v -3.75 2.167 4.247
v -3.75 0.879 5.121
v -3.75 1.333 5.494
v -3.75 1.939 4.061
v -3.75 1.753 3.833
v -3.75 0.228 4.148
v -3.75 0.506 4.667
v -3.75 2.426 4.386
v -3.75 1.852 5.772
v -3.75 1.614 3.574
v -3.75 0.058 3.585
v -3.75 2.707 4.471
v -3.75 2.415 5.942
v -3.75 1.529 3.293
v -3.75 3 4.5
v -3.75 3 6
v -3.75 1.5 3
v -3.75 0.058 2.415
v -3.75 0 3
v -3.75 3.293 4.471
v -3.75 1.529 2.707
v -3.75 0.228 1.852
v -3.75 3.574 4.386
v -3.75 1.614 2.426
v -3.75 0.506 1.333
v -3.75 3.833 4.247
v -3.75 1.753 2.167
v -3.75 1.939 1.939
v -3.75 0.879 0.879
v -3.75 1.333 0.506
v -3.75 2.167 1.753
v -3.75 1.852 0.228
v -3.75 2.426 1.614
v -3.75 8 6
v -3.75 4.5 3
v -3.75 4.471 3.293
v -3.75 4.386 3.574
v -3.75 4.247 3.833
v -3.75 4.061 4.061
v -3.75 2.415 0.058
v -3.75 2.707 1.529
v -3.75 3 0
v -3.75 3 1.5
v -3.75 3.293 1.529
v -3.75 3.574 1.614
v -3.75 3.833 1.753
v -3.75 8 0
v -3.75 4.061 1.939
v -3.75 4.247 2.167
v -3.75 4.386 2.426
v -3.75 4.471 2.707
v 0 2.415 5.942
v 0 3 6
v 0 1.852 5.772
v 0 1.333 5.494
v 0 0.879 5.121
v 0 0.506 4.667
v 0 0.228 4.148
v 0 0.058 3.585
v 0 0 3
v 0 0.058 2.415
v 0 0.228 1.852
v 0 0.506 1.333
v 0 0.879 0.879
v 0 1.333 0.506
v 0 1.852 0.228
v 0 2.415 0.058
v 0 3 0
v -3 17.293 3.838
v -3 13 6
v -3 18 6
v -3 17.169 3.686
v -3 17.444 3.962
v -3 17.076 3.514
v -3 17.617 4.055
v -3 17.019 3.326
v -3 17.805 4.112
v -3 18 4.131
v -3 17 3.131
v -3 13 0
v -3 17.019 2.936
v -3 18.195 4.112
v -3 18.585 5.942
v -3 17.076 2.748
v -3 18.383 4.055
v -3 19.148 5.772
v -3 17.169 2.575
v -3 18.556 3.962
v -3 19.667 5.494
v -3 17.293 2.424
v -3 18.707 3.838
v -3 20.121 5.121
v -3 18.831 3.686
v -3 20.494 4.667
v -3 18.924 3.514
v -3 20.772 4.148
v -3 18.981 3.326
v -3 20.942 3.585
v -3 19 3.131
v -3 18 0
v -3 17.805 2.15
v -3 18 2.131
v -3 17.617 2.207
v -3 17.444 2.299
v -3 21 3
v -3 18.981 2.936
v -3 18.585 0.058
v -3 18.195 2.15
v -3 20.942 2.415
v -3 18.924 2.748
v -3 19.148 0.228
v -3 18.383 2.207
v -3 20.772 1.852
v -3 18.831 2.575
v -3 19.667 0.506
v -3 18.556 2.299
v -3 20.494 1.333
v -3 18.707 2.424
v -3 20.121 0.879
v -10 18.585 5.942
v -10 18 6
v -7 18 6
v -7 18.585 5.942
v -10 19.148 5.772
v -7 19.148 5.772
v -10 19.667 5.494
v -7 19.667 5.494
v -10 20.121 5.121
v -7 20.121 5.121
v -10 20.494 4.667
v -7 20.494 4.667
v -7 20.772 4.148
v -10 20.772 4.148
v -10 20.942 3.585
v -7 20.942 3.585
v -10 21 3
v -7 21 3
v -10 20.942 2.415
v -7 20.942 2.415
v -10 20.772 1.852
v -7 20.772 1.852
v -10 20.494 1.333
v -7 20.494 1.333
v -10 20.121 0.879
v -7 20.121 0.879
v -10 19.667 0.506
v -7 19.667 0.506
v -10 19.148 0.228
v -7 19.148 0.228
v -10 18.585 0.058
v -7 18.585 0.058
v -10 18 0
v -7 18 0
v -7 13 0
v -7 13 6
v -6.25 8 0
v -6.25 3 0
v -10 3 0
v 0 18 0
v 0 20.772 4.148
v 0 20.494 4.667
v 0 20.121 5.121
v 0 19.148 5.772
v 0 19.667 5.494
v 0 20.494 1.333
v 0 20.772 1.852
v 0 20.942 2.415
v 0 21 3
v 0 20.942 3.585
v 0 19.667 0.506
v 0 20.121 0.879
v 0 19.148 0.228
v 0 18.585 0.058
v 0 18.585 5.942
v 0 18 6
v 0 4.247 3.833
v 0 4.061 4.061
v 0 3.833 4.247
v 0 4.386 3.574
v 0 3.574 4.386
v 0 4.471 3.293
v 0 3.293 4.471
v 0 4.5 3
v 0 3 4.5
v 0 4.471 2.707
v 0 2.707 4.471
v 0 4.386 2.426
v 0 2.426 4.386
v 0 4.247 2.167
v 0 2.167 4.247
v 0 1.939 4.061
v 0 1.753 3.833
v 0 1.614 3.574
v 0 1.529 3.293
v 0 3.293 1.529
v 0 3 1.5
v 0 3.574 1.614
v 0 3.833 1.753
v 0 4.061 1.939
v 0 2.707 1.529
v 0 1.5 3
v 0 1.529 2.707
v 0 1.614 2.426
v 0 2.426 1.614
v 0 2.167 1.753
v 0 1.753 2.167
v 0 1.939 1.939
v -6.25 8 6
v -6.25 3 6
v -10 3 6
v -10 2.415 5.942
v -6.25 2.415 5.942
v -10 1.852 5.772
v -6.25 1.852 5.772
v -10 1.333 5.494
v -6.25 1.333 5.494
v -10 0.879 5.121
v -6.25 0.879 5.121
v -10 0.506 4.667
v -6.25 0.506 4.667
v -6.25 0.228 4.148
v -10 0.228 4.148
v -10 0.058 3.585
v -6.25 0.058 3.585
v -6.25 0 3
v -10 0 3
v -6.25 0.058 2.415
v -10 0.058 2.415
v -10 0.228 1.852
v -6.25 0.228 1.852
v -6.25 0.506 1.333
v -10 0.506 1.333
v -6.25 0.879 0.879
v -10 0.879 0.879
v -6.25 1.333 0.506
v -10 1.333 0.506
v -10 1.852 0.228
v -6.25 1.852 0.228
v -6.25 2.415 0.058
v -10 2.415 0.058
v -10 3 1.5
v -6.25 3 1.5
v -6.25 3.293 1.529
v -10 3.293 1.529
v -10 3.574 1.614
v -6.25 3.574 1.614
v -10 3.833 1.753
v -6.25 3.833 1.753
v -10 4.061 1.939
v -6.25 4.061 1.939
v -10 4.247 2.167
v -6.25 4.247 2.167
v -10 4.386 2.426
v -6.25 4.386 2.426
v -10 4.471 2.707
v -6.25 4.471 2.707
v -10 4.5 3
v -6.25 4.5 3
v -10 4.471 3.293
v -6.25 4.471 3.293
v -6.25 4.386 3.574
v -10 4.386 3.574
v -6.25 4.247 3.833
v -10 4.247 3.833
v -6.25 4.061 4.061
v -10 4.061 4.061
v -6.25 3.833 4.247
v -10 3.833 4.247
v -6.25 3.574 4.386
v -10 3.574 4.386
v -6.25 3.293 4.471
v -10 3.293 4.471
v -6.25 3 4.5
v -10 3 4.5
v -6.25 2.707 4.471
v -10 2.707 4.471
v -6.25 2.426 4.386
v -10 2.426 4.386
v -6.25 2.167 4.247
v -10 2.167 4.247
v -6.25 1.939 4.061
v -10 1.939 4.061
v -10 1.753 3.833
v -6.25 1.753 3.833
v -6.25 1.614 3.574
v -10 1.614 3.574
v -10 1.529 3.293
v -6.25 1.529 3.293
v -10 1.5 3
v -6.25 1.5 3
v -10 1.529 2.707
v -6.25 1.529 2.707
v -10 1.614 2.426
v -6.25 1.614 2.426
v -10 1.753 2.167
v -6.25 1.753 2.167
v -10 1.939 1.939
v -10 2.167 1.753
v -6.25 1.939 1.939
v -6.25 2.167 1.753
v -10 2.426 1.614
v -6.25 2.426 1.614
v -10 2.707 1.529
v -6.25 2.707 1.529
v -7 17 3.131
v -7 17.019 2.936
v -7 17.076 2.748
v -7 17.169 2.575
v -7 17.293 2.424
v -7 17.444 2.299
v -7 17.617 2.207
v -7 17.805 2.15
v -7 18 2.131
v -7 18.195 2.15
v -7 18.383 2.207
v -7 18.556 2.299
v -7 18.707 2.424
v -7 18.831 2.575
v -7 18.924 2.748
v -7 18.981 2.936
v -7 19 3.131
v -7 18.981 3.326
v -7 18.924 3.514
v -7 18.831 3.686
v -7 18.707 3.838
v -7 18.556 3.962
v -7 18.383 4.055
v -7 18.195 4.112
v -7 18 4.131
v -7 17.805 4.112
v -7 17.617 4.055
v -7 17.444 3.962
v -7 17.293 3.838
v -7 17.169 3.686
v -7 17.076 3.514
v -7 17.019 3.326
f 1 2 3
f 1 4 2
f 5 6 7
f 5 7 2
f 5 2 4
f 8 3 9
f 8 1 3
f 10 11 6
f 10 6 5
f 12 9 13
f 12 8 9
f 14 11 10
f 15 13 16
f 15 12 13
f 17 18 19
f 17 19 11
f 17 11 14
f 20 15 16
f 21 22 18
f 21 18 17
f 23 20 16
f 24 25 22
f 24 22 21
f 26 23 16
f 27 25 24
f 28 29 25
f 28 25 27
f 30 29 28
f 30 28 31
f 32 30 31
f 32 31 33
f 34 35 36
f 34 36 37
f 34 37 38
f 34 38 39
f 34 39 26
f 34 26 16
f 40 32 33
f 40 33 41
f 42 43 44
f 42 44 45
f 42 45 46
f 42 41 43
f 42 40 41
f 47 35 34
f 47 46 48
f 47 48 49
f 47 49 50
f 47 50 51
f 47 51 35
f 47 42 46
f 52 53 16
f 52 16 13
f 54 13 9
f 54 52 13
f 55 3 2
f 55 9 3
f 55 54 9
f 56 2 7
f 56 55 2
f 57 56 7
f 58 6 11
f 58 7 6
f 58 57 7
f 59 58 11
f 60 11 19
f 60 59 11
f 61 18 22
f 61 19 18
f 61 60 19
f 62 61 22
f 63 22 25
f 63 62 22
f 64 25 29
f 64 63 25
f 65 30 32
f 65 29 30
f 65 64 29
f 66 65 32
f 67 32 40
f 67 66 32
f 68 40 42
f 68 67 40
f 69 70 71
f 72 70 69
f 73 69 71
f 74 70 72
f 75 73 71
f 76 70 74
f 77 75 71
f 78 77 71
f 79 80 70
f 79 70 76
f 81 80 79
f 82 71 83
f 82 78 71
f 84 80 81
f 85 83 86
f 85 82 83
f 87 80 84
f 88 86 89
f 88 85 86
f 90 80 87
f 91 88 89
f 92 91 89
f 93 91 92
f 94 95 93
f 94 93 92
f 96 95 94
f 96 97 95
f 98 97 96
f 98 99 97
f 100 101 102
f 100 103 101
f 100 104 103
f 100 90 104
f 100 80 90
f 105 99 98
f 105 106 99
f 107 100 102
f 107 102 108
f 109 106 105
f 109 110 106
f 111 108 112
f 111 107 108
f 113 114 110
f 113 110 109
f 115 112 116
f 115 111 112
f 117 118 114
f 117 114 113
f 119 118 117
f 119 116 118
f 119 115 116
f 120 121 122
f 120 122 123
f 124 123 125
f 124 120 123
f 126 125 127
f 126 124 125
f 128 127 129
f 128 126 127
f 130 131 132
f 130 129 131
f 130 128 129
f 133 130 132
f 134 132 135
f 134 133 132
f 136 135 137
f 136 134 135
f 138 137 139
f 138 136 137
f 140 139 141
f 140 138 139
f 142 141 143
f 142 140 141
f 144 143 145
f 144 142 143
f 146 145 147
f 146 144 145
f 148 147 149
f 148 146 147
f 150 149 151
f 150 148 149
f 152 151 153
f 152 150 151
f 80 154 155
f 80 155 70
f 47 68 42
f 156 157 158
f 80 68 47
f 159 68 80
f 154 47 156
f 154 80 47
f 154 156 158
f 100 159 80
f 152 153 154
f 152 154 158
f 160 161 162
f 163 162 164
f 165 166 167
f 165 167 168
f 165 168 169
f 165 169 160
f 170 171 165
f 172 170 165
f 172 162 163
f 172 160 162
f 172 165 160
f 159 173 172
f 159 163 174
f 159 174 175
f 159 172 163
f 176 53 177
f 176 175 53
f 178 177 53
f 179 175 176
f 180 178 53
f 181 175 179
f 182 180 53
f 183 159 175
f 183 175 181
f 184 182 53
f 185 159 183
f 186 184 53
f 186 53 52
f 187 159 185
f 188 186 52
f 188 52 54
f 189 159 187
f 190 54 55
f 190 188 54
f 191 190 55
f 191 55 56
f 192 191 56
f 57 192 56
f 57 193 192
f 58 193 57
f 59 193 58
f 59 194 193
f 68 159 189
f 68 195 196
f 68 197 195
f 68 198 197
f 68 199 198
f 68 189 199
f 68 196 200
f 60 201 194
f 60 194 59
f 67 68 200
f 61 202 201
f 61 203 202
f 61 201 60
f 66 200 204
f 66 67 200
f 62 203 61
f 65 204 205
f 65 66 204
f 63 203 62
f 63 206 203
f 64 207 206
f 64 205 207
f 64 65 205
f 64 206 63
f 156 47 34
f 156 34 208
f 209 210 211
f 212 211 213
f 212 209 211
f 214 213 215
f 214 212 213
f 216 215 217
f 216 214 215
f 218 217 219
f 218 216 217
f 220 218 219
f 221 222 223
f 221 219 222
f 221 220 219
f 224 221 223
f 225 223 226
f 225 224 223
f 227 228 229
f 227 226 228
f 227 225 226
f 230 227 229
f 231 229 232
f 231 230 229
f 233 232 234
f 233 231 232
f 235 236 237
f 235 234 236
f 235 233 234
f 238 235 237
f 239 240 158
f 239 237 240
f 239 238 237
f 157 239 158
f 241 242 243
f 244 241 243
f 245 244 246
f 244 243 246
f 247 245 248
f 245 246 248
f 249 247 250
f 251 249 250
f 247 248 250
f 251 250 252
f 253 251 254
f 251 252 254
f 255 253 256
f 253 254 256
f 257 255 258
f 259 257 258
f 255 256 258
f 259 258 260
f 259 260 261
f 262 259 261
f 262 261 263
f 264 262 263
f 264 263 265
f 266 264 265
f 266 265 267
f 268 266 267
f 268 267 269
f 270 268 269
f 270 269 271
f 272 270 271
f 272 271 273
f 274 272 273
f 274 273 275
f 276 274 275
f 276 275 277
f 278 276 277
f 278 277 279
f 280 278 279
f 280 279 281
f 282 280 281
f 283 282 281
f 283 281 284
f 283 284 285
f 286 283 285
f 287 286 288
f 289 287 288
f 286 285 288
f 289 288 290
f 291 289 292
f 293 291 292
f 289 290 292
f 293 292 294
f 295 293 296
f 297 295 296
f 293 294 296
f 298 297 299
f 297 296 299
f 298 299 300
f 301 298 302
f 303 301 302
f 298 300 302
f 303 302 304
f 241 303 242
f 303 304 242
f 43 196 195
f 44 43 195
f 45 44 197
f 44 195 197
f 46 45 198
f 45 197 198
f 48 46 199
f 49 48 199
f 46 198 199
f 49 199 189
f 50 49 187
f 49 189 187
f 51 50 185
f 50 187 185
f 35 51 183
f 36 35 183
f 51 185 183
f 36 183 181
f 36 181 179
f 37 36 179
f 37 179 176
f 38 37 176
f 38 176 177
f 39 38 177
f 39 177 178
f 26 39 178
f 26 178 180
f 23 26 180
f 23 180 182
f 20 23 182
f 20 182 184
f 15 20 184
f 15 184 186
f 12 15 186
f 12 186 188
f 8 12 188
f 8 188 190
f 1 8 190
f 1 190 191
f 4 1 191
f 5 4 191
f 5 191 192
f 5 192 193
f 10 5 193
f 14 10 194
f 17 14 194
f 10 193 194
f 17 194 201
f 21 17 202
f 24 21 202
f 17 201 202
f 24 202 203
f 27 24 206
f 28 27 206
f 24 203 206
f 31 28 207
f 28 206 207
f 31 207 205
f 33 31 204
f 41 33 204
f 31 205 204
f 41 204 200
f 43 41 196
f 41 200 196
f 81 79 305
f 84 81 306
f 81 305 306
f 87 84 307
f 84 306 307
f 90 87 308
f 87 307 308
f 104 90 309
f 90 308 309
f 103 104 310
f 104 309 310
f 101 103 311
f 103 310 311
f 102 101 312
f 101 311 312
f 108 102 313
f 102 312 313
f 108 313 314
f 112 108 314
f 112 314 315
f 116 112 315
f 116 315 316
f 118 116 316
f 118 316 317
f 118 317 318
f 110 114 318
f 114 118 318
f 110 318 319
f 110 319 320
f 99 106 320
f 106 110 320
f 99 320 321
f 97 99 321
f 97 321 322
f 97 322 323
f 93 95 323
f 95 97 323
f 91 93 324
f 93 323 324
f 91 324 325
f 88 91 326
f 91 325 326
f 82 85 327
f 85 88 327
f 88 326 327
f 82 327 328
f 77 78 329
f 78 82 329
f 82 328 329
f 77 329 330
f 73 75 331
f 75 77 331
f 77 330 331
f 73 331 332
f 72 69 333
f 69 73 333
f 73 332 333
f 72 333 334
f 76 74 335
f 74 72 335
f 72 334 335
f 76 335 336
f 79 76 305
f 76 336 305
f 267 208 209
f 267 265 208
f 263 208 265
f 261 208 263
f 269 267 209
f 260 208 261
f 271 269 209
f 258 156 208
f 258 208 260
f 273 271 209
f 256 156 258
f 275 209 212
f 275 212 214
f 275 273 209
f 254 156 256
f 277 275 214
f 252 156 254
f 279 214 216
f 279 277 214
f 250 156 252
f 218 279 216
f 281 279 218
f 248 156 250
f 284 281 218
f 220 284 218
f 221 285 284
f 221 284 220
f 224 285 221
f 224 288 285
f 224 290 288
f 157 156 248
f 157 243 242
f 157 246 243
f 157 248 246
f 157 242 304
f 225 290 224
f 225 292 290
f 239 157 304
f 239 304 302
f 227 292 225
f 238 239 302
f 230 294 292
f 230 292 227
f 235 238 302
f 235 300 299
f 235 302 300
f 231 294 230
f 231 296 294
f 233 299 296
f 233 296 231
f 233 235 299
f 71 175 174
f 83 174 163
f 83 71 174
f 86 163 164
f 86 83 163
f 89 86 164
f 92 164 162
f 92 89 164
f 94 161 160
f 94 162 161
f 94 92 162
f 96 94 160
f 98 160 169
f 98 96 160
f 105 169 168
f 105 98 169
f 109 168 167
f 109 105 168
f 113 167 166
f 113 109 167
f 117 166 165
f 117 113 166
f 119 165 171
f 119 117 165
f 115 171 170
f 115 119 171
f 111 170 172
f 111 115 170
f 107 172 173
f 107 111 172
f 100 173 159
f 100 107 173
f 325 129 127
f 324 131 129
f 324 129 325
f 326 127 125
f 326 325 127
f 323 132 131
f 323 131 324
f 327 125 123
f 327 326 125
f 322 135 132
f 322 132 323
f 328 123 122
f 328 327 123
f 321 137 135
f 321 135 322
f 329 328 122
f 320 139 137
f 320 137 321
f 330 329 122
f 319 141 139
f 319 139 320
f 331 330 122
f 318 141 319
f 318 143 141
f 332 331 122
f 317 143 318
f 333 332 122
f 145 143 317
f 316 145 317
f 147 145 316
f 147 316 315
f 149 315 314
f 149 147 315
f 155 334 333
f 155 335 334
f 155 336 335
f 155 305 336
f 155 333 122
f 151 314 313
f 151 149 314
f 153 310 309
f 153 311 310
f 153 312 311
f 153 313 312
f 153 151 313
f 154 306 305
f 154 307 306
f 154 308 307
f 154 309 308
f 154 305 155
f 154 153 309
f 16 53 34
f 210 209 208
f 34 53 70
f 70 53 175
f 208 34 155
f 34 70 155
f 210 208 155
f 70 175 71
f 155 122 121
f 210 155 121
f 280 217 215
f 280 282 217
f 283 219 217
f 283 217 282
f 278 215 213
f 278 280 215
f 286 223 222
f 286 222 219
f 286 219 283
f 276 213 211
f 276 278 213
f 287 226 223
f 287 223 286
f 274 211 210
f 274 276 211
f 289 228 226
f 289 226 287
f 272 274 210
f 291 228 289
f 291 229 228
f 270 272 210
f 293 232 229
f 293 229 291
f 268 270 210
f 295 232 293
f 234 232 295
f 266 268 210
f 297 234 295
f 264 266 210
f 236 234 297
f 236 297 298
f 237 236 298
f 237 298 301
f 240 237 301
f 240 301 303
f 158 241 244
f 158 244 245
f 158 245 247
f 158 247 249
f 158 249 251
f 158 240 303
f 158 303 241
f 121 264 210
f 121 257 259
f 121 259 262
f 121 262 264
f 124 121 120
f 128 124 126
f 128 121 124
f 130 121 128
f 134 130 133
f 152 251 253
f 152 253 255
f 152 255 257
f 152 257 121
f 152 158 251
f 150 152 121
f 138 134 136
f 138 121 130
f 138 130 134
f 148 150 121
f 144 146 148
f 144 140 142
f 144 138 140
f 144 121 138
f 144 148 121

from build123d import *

# Parameters (mm, degrees)
SALIENTE_EXTRUIR1_DEPTH = 6
REDONDEO1_RADIUS        = 3
REDONDEO1_LENGTH        = 3.75
REDONDEO2_RADIUS        = 3
REDONDEO2_LENGTH        = 3
REDONDEO3_RADIUS        = 3
REDONDEO3_LENGTH        = 3
REDONDEO4_RADIUS        = 3
REDONDEO4_LENGTH        = 3.75
CORTAR_EXTRUIR1_REACH   = 26.021
CROQUIS2_R              = 1.5
SALIENTE_EXTRUIR3_REACH = 24.935
CROQUIS4_R              = 1


with BuildPart() as part:
    # Croquis1 → Saliente-Extruir1 (new body)
    with BuildSketch(Plane.XY):
        Polygon((-7, 21), (-7, 13), (-3, 13), (-3, 21), (0, 21), (0, 0), (-3.75, 0), (-3.75, 8), (-6.25, 8), (-6.25, 0), (-10, 0), (-10, 21), align=None)
    extrude(amount=SALIENTE_EXTRUIR1_DEPTH)

    # Redondeo1: full round fillet: the end face becomes a half cylinder, R = half its width
    redondeo1_face = Plane((-1.875, 0, 3), x_dir=(1, 0, 0), z_dir=(0, -1, 0))  # on the end face: x along it, z out of the body
    redondeo1_slab = redondeo1_face.offset(-REDONDEO1_RADIUS / 2) * Box(REDONDEO1_LENGTH, 2 * REDONDEO1_RADIUS, REDONDEO1_RADIUS, mode=Mode.PRIVATE)  # the body's end, R deep
    redondeo1_round = Plane((-1.875, 3, 3), x_dir=(0, -1, 0), z_dir=(1, 0, 0)) * Cylinder(REDONDEO1_RADIUS, REDONDEO1_LENGTH, mode=Mode.PRIVATE)  # its axis R under the face
    add(redondeo1_slab - redondeo1_round, mode=Mode.SUBTRACT)

    # Redondeo2: full round fillet: the end face becomes a half cylinder, R = half its width
    redondeo2_face = Plane((-1.5, 21, 3), x_dir=(-1, 0, 0), z_dir=(0, 1, 0))  # on the end face: x along it, z out of the body
    redondeo2_slab = redondeo2_face.offset(-REDONDEO2_RADIUS / 2) * Box(REDONDEO2_LENGTH, 2 * REDONDEO2_RADIUS, REDONDEO2_RADIUS, mode=Mode.PRIVATE)  # the body's end, R deep
    redondeo2_round = Plane((-1.5, 18, 3), x_dir=(0, 1, 0), z_dir=(-1, 0, 0)) * Cylinder(REDONDEO2_RADIUS, REDONDEO2_LENGTH, mode=Mode.PRIVATE)  # its axis R under the face
    add(redondeo2_slab - redondeo2_round, mode=Mode.SUBTRACT)

    # Redondeo3: full round fillet: the end face becomes a half cylinder, R = half its width
    redondeo3_face = Plane((-8.5, 21, 3), x_dir=(-1, 0, 0), z_dir=(0, 1, 0))  # on the end face: x along it, z out of the body
    redondeo3_slab = redondeo3_face.offset(-REDONDEO3_RADIUS / 2) * Box(REDONDEO3_LENGTH, 2 * REDONDEO3_RADIUS, REDONDEO3_RADIUS, mode=Mode.PRIVATE)  # the body's end, R deep
    redondeo3_round = Plane((-8.5, 18, 3), x_dir=(0, 1, 0), z_dir=(-1, 0, 0)) * Cylinder(REDONDEO3_RADIUS, REDONDEO3_LENGTH, mode=Mode.PRIVATE)  # its axis R under the face
    add(redondeo3_slab - redondeo3_round, mode=Mode.SUBTRACT)

    # Redondeo4: full round fillet: the end face becomes a half cylinder, R = half its width
    redondeo4_face = Plane((-8.125, 0, 3), x_dir=(1, 0, 0), z_dir=(0, -1, 0))  # on the end face: x along it, z out of the body
    redondeo4_slab = redondeo4_face.offset(-REDONDEO4_RADIUS / 2) * Box(REDONDEO4_LENGTH, 2 * REDONDEO4_RADIUS, REDONDEO4_RADIUS, mode=Mode.PRIVATE)  # the body's end, R deep
    redondeo4_round = Plane((-8.125, 3, 3), x_dir=(0, -1, 0), z_dir=(1, 0, 0)) * Cylinder(REDONDEO4_RADIUS, REDONDEO4_LENGTH, mode=Mode.PRIVATE)  # its axis R under the face
    add(redondeo4_slab - redondeo4_round, mode=Mode.SUBTRACT)

    # Cortar-Extruir1: up to this face of the body (flat: up to its plane)
    cortar_extruir1_end = Plane(part.part.faces().sort_by_distance((-10, 10.5, 3))[0])
    # Croquis2 → Cortar-Extruir1 (cut, up to the picked face)
    with BuildSketch(Plane(origin=(0, 0, 0), x_dir=(0, 0, -1), z_dir=(1, 0, 0)), mode=Mode.PRIVATE) as cortar_extruir1_sk1:
        with Locations((-3, 3)):
            Circle(CROQUIS2_R)
    cortar_extruir1_tool1 = split(extrude(cortar_extruir1_sk1.sketch, amount=-CORTAR_EXTRUIR1_REACH, mode=Mode.PRIVATE), bisect_by=cortar_extruir1_end, keep=Keep.BOTH, mode=Mode.PRIVATE)
    add(cortar_extruir1_tool1.solids().sort_by(Axis((0, 3, 3), (-1, 0, 0)))[0], mode=Mode.SUBTRACT)

    # Croquis4 → Saliente-Extruir3 (add, up to next)
    with BuildSketch(Plane(origin=(-7, 0, 0), x_dir=(0, 0, -1), z_dir=(1, 0, 0)), mode=Mode.PRIVATE) as saliente_extruir3_sk1:
        with Locations(Location((-3.130856321, 18, 0), (0, 0, 270))):
            Circle(CROQUIS4_R)
    saliente_extruir3_tool1 = extrude(saliente_extruir3_sk1.sketch, amount=SALIENTE_EXTRUIR3_REACH, mode=Mode.PRIVATE) - part.part
    add(saliente_extruir3_tool1.solids().sort_by_distance((-7, 18, 3.130856))[0])


solid = part.part
